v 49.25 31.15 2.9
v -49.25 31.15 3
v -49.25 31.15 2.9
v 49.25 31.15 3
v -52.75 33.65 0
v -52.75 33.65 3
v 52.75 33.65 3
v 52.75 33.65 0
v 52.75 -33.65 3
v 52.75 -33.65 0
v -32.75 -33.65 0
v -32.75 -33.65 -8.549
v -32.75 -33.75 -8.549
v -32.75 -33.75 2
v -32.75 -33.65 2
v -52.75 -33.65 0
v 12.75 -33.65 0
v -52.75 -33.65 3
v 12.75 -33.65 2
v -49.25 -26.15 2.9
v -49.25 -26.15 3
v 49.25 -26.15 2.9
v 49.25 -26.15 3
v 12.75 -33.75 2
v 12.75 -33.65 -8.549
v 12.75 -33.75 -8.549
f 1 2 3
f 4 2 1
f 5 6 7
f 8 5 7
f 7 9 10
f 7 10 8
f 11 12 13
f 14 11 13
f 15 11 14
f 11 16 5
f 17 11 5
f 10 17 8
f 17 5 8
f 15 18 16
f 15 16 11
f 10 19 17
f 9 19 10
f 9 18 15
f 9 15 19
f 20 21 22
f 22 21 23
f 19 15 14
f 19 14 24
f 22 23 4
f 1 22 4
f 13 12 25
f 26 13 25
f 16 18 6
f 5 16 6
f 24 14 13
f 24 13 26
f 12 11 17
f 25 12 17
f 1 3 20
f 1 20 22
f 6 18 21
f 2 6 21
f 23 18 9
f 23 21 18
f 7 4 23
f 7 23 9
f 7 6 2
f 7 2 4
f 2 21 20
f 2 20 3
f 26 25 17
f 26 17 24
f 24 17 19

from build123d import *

# Parameters (mm, degrees)
SKETCH_1_W          = 105.5
SKETCH_1_H          = 67.3
EXTRUDE_1_DEPTH     = 3
SKETCH_2_W          = 45.5
SKETCH_2_H          = 10.549345268
EXTRUDE_2_DEPTH     = 0.1
SKETCH_3_W          = 98.5
SKETCH_3_H          = 57.3
CUT_EXTRUDE_1_DEPTH = 0.1


with BuildPart() as part:
    # 草图1 → 凸台-拉伸1 (new body)
    with BuildSketch(Plane.XY.offset(3)):
        Rectangle(SKETCH_1_W, SKETCH_1_H)
    extrude(amount=-EXTRUDE_1_DEPTH)

    # 草图2 → 凸台-拉伸2 (add)
    with BuildSketch(Plane.XZ.offset(33.65)):
        with Locations((-10, -3.274672634)):
            Rectangle(SKETCH_2_W, SKETCH_2_H)
    extrude(amount=EXTRUDE_2_DEPTH)

    # 草图3 → 切除-拉伸1 (cut)
    with BuildSketch(Plane.XY.offset(3)):
        with Locations((0, 2.5)):
            Rectangle(SKETCH_3_W, SKETCH_3_H)
    extrude(amount=-CUT_EXTRUDE_1_DEPTH, mode=Mode.SUBTRACT)


solid = part.part
